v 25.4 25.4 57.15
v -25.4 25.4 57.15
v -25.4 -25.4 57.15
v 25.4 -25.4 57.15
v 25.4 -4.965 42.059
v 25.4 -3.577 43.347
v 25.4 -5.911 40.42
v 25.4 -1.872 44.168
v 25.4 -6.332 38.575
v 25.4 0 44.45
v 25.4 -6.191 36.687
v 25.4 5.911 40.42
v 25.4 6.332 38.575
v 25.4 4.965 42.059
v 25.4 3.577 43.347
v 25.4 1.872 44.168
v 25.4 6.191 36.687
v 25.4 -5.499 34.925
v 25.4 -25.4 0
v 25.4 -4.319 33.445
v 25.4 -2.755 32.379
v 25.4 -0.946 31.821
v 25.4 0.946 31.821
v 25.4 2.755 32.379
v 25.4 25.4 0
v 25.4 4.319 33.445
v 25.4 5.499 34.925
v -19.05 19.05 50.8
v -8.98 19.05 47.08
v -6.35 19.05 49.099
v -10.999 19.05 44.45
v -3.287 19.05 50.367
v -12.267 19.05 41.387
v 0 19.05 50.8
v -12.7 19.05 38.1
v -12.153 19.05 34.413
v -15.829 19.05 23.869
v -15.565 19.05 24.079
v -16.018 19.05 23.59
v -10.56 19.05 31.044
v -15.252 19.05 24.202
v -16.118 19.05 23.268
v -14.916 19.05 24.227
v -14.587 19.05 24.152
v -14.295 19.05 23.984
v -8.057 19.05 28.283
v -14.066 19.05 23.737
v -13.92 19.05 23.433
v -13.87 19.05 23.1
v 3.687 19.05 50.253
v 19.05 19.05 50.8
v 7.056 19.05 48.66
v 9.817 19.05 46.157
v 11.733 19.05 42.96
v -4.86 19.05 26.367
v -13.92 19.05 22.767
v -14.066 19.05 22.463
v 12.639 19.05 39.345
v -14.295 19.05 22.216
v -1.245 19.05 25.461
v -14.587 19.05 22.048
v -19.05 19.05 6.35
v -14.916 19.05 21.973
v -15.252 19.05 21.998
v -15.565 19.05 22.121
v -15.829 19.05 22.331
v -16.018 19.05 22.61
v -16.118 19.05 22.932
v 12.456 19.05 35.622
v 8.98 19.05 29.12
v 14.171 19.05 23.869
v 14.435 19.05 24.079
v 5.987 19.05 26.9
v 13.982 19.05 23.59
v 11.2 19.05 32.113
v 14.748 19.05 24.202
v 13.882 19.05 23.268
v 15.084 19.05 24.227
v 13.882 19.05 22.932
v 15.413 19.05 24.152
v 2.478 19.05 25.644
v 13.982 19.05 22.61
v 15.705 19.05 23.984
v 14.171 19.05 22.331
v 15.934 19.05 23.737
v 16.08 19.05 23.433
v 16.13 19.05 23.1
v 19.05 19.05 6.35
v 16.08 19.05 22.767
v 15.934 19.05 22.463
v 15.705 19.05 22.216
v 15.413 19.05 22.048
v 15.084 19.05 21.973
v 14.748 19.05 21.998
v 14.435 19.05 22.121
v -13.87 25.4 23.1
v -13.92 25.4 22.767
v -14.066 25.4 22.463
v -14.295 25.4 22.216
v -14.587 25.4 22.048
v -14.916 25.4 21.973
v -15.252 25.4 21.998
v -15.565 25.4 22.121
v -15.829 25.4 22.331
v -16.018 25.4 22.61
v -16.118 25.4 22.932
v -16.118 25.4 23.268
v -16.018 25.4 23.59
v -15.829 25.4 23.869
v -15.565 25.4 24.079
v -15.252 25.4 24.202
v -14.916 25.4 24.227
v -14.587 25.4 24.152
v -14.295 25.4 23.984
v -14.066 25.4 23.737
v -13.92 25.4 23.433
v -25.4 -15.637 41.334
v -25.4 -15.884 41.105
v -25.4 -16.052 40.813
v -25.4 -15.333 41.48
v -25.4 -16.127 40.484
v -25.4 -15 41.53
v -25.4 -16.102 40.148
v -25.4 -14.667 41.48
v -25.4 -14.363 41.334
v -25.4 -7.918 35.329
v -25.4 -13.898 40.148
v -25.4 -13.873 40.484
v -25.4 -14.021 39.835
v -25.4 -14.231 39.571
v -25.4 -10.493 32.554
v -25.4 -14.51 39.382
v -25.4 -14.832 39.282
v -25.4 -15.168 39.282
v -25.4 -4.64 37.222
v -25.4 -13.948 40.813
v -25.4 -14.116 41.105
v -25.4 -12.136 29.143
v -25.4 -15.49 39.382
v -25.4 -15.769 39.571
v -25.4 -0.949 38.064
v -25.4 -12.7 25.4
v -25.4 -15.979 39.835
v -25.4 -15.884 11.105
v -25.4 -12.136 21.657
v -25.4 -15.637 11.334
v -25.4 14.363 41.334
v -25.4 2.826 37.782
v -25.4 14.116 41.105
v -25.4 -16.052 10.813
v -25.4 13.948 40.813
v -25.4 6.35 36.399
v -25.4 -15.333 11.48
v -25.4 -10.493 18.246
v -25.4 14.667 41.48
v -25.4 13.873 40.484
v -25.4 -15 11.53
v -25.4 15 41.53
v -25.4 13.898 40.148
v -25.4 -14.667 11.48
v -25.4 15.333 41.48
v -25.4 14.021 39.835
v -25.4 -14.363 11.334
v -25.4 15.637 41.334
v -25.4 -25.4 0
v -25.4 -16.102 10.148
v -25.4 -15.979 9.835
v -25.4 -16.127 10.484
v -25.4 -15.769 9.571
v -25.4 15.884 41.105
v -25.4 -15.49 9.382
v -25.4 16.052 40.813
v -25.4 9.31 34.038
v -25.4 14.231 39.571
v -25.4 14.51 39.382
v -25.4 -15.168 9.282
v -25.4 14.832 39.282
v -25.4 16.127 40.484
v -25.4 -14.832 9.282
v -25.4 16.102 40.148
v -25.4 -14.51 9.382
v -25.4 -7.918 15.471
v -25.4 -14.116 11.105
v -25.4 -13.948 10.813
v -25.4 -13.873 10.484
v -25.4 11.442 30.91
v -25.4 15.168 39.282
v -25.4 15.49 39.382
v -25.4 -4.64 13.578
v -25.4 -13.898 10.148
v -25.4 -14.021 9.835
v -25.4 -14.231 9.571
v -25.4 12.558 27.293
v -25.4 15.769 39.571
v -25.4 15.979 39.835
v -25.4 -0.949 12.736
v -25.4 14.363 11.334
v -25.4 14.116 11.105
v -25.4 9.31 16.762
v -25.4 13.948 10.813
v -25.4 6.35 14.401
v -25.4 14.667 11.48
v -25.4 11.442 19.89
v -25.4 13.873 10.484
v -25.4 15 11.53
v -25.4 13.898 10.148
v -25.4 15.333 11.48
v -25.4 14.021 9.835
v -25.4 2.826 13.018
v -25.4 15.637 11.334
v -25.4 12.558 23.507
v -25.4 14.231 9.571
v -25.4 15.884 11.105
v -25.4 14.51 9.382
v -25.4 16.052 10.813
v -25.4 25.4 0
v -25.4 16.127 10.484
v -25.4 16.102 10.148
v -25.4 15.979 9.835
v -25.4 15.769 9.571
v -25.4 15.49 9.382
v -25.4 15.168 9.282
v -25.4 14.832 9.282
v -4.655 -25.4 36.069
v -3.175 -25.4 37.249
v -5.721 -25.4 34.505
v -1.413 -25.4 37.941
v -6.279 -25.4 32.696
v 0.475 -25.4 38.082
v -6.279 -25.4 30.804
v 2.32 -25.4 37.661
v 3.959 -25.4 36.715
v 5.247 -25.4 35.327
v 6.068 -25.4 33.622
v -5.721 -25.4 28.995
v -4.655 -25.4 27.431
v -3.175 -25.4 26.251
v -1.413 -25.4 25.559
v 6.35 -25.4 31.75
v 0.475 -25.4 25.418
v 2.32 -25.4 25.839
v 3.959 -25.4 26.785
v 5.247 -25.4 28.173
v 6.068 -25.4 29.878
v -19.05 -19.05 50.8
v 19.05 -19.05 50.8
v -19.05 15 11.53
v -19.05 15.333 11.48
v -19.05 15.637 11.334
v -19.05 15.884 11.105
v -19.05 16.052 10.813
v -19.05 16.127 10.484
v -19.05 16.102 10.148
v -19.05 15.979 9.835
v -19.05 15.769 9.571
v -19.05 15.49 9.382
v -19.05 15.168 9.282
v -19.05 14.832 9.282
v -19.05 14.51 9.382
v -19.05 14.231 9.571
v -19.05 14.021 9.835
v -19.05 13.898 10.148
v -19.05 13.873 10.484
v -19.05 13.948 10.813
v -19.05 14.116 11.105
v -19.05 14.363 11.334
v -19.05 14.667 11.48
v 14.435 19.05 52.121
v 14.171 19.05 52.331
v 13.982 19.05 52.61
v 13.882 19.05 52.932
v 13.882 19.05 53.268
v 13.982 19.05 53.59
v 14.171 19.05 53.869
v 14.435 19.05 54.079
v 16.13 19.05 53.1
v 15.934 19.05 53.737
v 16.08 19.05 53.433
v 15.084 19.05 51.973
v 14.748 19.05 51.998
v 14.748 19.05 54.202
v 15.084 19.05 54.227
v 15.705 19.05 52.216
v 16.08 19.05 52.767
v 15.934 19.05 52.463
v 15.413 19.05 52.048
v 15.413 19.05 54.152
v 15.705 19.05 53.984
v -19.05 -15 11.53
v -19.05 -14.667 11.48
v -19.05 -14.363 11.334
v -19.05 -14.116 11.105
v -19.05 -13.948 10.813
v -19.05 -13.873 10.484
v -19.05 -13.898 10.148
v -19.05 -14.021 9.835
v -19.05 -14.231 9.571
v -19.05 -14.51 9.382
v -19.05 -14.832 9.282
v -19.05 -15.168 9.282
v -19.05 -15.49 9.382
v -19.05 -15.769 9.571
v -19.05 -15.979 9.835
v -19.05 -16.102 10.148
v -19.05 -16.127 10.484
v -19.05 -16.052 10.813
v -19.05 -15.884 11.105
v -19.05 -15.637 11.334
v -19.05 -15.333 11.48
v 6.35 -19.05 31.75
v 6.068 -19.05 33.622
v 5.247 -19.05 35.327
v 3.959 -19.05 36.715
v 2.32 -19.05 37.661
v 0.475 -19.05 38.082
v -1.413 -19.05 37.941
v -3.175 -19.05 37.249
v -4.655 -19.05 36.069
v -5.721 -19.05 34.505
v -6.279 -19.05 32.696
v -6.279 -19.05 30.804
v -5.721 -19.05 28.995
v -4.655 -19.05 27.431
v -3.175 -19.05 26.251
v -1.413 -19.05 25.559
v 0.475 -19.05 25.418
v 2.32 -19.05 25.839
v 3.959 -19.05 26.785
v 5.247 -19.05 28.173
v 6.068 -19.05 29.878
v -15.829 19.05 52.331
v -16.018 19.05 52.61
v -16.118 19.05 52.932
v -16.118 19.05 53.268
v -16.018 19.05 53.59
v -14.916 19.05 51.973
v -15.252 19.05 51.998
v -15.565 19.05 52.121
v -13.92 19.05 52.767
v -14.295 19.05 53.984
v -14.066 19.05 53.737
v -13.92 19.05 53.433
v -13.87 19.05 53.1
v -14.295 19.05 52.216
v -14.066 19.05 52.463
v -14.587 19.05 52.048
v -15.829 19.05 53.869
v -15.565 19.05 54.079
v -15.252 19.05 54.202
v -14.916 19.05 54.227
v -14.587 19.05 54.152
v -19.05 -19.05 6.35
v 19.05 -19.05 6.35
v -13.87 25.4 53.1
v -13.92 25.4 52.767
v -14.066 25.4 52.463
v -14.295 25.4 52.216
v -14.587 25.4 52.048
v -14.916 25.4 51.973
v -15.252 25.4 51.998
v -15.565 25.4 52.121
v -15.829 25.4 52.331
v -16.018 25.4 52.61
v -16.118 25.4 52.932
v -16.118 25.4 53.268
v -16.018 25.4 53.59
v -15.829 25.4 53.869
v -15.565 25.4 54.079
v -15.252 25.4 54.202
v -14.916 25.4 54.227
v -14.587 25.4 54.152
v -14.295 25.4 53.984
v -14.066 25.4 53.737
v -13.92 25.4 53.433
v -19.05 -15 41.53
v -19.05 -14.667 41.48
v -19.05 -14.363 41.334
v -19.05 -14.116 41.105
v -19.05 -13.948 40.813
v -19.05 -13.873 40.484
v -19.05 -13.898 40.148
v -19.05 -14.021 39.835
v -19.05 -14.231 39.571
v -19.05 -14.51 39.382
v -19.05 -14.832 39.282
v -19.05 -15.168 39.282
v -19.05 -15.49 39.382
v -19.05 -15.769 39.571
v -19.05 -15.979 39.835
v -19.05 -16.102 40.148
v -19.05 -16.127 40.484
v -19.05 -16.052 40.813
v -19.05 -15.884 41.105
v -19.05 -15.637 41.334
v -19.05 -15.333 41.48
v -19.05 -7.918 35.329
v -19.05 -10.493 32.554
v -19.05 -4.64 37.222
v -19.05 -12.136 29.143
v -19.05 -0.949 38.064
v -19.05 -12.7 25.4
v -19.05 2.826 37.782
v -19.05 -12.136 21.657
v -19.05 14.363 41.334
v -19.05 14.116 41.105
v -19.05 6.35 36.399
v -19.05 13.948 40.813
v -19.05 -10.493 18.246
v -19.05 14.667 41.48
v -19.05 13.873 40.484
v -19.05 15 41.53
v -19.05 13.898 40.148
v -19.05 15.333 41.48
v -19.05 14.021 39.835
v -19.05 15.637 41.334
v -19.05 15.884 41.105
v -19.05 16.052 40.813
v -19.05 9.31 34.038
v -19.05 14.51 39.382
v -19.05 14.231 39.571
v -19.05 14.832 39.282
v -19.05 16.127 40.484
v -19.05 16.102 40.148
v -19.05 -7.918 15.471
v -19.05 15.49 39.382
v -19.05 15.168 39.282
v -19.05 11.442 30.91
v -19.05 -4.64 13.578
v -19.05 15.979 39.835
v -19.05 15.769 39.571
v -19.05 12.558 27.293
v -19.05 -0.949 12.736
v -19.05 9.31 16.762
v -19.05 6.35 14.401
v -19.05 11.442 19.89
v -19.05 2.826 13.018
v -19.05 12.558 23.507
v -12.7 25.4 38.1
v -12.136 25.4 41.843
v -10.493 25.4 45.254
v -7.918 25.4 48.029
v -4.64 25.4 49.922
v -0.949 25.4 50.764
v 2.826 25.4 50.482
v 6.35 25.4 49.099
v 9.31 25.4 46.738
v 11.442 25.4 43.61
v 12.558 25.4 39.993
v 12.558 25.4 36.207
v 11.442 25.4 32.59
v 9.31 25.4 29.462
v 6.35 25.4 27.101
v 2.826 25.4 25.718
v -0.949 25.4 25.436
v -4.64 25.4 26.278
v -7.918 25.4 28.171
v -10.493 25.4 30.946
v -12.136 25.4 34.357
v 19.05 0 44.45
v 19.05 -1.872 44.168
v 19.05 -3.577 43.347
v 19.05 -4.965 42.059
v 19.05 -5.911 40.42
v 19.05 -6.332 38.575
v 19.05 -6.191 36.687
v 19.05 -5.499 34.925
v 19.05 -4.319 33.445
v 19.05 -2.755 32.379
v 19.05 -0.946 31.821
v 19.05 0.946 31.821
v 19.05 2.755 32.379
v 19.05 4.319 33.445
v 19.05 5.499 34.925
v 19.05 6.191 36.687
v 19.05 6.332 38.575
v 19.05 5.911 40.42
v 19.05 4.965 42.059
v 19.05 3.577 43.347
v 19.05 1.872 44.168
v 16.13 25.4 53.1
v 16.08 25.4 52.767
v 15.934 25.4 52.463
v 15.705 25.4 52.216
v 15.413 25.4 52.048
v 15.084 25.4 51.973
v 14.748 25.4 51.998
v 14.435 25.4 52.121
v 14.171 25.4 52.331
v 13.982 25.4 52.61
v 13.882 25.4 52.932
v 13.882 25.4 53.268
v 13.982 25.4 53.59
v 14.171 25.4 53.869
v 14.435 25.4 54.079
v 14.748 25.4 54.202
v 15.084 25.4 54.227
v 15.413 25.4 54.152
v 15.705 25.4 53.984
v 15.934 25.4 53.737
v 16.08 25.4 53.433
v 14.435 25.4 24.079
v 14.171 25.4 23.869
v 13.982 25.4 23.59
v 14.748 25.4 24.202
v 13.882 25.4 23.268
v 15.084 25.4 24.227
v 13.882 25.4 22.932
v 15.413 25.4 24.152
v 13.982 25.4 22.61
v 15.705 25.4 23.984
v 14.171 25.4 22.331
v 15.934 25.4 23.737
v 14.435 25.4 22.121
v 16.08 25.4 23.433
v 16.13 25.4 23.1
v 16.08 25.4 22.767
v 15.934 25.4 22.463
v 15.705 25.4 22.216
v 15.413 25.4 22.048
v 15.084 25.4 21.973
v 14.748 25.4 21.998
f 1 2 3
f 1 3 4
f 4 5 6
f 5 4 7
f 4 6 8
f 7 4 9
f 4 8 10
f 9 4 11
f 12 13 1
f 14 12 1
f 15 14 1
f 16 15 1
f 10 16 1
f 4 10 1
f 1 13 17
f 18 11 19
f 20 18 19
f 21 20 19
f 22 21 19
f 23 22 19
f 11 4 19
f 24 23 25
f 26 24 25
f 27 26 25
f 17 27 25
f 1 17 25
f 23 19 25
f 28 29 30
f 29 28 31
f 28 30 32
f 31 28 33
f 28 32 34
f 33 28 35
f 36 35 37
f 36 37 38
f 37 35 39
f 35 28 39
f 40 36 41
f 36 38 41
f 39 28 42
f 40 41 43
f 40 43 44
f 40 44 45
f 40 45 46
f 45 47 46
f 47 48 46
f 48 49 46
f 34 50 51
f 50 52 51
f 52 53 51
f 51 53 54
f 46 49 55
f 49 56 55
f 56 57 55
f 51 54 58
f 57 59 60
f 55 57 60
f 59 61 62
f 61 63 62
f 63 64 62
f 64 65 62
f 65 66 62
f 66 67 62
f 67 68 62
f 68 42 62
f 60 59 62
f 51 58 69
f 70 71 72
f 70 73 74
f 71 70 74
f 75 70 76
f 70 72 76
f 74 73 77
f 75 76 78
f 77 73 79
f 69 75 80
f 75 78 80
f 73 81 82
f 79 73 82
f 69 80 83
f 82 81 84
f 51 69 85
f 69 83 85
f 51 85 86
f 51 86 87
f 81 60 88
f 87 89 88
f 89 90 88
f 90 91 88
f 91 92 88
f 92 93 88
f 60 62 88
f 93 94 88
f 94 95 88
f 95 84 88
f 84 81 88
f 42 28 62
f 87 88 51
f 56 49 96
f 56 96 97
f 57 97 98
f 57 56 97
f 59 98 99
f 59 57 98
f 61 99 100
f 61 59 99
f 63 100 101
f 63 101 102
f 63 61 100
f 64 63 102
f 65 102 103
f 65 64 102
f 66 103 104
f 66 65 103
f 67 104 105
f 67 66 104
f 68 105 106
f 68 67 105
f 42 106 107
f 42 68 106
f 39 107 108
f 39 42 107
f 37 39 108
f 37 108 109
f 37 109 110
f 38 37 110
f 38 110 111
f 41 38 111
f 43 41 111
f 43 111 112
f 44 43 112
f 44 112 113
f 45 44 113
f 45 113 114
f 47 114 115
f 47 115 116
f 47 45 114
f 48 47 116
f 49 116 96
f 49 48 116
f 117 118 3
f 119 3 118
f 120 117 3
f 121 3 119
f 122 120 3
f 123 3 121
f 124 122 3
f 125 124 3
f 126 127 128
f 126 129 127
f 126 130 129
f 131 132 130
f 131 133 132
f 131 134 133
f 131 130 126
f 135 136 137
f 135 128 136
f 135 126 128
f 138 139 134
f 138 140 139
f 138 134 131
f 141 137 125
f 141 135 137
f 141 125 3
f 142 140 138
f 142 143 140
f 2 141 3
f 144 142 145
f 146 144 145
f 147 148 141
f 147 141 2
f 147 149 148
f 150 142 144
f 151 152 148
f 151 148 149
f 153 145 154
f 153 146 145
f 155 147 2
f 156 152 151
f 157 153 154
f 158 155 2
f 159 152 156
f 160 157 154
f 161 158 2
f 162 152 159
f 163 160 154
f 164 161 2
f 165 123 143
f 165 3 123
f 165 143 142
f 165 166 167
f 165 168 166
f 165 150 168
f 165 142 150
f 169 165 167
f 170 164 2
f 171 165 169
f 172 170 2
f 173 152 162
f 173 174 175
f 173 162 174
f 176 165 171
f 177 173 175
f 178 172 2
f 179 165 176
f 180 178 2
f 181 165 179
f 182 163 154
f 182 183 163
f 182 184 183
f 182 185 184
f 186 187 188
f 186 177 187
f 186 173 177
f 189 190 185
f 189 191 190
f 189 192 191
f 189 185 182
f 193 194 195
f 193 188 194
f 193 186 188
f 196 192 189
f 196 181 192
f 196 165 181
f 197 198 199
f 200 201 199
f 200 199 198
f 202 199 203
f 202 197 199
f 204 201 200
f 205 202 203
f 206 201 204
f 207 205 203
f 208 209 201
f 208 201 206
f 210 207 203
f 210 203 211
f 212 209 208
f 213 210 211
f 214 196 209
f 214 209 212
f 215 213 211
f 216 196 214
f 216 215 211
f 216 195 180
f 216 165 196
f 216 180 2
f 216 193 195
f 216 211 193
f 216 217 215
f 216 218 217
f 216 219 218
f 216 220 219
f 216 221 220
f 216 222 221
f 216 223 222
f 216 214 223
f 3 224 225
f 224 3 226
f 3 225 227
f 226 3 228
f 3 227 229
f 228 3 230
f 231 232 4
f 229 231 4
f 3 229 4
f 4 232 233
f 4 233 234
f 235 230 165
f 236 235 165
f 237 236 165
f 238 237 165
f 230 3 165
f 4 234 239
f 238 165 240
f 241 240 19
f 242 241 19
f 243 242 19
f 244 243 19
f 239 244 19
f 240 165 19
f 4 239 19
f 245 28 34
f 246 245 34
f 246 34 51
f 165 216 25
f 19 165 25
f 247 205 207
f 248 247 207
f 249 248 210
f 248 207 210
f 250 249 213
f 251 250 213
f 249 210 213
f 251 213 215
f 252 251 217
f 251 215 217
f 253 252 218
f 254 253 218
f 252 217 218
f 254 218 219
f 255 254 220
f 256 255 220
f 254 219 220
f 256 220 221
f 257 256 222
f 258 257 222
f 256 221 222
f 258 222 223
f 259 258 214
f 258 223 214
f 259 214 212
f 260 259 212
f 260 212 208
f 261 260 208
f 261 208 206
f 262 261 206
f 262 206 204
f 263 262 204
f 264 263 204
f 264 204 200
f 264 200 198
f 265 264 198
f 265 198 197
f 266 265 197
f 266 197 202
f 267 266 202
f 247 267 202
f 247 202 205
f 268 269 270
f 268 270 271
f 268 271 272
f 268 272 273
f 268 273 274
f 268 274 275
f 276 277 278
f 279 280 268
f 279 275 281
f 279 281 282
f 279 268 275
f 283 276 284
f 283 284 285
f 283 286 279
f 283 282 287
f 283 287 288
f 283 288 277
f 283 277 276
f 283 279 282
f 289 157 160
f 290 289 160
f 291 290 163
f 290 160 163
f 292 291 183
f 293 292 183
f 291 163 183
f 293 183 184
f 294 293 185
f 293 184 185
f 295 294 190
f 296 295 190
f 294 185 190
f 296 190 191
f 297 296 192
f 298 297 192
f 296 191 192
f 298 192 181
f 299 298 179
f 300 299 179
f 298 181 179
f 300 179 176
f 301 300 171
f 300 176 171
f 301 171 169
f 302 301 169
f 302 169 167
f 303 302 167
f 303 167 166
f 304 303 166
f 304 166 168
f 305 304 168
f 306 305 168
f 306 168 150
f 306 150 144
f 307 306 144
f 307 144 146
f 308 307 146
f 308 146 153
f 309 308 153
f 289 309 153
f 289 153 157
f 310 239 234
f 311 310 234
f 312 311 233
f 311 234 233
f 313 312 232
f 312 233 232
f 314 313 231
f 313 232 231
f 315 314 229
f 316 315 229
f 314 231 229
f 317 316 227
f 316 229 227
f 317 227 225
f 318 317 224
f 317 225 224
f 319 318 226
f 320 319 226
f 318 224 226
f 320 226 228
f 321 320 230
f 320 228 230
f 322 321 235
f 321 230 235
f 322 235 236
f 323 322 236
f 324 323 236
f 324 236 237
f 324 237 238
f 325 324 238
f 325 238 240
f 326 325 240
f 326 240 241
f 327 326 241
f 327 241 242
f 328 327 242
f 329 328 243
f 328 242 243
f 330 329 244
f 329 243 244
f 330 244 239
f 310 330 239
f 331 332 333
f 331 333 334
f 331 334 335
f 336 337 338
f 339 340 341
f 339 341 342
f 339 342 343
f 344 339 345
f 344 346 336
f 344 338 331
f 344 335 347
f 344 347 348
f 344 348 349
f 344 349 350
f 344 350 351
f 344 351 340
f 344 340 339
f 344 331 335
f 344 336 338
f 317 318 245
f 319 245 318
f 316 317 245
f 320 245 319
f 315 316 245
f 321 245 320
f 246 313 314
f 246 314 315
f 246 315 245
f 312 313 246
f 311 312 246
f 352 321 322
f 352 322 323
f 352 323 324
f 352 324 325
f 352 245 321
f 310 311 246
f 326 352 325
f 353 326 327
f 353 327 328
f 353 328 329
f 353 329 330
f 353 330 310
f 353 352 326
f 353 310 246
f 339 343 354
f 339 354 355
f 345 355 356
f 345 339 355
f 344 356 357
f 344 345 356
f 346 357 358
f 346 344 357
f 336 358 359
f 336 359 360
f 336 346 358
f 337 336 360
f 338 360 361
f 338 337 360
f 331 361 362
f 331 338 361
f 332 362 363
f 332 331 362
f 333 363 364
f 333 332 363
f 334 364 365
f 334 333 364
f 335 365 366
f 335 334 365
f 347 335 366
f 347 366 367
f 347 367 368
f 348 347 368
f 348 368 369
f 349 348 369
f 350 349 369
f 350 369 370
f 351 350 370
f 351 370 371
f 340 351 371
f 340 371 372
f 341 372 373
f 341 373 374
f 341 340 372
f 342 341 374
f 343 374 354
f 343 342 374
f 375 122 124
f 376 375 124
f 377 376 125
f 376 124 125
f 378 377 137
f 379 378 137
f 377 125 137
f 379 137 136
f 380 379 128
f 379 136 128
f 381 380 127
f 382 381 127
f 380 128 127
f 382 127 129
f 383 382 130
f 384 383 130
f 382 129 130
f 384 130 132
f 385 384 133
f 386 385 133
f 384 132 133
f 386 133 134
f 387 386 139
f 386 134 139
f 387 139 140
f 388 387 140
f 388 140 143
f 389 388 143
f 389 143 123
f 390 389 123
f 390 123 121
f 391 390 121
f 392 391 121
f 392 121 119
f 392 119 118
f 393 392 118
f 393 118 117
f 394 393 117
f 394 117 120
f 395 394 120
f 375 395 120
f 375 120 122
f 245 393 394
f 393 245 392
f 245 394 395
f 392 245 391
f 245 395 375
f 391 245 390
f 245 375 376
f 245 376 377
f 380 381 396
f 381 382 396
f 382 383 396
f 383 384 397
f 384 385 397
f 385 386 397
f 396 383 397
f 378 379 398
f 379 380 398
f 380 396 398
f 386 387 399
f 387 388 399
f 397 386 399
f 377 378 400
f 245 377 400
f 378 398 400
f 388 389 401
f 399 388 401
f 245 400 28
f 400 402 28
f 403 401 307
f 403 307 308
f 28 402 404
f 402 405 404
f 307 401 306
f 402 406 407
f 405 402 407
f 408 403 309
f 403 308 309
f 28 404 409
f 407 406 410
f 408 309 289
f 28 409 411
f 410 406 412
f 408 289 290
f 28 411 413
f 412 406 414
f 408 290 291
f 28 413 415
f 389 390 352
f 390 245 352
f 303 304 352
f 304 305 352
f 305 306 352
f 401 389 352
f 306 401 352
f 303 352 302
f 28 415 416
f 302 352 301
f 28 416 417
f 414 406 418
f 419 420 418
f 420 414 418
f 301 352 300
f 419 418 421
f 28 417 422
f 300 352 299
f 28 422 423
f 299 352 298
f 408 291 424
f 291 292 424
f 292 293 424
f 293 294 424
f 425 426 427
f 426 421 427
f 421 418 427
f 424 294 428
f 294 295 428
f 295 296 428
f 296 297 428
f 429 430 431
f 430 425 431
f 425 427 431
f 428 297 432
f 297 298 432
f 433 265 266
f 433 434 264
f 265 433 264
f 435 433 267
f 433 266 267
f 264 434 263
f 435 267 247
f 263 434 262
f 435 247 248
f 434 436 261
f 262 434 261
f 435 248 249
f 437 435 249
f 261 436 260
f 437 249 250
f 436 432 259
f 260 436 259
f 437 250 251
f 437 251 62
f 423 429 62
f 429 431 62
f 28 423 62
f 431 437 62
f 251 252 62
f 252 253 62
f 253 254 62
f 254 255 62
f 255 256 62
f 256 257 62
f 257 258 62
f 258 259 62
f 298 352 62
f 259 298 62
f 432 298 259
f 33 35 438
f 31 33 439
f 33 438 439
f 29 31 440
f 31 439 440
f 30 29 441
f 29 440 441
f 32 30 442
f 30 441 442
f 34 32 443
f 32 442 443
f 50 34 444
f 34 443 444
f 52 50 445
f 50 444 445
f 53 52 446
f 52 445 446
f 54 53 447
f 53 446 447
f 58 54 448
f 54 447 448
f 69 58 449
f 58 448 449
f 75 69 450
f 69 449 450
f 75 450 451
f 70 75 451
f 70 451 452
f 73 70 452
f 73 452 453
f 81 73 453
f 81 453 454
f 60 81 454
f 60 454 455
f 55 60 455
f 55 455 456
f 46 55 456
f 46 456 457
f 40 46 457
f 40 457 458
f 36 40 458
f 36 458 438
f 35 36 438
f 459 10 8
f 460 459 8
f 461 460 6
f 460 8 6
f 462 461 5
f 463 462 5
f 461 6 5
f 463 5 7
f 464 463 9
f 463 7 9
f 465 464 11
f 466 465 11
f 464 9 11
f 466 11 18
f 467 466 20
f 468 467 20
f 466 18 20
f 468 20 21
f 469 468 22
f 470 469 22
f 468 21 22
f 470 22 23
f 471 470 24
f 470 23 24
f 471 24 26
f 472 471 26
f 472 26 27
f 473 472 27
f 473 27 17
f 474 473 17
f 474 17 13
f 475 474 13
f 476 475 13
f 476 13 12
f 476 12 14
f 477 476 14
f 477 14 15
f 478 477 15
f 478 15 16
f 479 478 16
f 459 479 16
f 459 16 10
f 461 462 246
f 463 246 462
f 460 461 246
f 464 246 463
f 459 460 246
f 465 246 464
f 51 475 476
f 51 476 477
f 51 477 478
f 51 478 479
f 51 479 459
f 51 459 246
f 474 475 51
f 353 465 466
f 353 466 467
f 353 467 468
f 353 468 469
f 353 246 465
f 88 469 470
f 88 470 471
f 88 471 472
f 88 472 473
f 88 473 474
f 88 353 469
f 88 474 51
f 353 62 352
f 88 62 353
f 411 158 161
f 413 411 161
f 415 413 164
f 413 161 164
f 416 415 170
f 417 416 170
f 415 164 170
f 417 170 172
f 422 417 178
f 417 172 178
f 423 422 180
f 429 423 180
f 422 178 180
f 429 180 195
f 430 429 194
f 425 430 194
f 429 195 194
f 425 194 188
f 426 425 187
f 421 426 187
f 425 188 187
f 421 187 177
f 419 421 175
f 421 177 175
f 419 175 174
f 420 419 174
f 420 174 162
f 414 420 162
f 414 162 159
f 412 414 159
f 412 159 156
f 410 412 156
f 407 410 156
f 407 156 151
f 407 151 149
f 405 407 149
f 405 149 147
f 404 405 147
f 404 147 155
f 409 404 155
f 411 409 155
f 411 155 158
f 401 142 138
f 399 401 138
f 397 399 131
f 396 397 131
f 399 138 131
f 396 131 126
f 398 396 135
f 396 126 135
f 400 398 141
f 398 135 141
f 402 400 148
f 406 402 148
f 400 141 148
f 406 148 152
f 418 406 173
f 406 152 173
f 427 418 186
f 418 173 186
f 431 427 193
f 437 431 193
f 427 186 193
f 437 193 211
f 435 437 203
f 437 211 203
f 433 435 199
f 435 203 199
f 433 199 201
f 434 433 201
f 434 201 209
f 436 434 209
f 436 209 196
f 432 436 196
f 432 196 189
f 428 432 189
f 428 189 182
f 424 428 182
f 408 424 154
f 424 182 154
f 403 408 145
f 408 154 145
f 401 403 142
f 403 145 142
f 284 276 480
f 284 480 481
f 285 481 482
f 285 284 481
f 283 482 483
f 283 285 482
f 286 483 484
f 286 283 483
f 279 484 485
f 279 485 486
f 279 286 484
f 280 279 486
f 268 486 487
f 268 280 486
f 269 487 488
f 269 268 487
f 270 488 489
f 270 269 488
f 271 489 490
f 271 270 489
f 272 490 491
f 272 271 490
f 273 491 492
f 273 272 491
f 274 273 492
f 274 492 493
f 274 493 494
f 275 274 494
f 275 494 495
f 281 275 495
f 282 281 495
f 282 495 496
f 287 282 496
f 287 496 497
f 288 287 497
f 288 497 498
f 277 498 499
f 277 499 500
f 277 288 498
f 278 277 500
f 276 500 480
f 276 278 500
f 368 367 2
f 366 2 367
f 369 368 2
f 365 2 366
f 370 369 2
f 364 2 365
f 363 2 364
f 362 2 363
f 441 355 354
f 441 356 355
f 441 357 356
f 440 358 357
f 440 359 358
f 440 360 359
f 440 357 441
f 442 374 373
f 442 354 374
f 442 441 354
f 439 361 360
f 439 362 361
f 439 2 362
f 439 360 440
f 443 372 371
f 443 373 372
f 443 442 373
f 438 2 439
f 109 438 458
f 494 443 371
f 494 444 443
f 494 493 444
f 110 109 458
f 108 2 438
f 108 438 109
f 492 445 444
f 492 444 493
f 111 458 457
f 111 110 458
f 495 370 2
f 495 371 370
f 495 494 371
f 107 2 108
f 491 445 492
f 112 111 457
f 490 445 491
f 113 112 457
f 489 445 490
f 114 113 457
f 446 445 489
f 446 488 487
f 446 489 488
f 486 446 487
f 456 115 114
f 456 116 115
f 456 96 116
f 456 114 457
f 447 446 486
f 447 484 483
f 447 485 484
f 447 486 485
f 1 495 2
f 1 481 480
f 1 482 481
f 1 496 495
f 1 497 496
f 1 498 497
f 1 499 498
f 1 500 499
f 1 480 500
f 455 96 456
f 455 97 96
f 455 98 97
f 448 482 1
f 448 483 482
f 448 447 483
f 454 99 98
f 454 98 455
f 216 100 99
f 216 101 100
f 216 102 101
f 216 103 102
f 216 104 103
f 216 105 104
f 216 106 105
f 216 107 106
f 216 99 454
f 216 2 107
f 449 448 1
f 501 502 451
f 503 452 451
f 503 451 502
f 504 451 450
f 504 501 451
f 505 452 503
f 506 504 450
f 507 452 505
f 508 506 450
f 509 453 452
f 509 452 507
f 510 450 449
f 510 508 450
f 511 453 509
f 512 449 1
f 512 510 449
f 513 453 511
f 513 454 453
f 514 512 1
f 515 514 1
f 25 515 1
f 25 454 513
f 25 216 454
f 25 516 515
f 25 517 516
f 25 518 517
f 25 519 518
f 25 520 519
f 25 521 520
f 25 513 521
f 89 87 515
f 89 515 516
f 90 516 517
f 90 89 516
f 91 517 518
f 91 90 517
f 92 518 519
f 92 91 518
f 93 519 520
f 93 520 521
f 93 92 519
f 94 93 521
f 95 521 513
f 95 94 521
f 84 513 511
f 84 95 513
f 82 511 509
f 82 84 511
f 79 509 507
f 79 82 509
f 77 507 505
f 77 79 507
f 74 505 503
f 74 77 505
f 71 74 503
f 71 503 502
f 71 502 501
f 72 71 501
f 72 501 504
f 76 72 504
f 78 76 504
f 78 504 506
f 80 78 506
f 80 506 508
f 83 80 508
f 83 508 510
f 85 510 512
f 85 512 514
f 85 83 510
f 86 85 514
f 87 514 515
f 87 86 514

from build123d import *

# Parameters (mm, degrees)
SKETCH1_W                                = 50.8
SKETCH1_H                                = 50.8
BOSS_EXTRUDE1_DEPTH                      = 57.15
CUT_EXTRUDE2_START                       = 6.35
SKETCH3_W                                = 38.1
SKETCH3_H                                = 38.1
CUT_EXTRUDE2_DEPTH                       = 44.45
SKETCH5_R                                = 12.7
CUT_EXTRUDE3_DEPTH                       = 6.35
SKETCH6_R                                = 12.7
CUT_EXTRUDE4_DEPTH                       = 6.35
SKETCH7_R                                = 6.35
CUT_EXTRUDE5_DEPTH                       = 6.35
F_3_8_0_375_CLEARANCE_DOWEL_HOLE1_REACH  = 70.392
F_3_8_0_375_CLEARANCE_DOWEL_HOLE1_BORE_R = 6.35
TAP_DRILL_FOR_4_40_TAP1_REACH            = 82.572
TAP_DRILL_FOR_4_40_TAP1_BORE_R           = 1.1303
TAP_START                                = 19.05
TAP_DRILL_FOR_4_40_TAP2_OUTLINE_R        = 1.1303
TAP_DRILL_FOR_4_40_TAP2_DEPTH            = 6.35


# Read off the part's stored shape, not the designer's step: Tap Drill for #4-40 Tap2
with BuildPart() as part:
    # Sketch1 → Boss-Extrude1 (new body)
    with BuildSketch(Plane.XY):
        Rectangle(SKETCH1_W, SKETCH1_H)
    extrude(amount=BOSS_EXTRUDE1_DEPTH)

    # Sketch3 → Cut-Extrude2 (cut)
    with BuildSketch(Plane.XY.offset(CUT_EXTRUDE2_START)):
        Rectangle(SKETCH3_W, SKETCH3_H)
    extrude(amount=CUT_EXTRUDE2_DEPTH, mode=Mode.SUBTRACT)

    # Sketch5 → Cut-Extrude3 (cut)
    with BuildSketch(Plane.ZY.offset(25.4)):
        with Locations(Location((25.4, 0, 0), (0, 0, 270))):
            Circle(SKETCH5_R)
    extrude(amount=-CUT_EXTRUDE3_DEPTH, mode=Mode.SUBTRACT)

    # Sketch6 → Cut-Extrude4 (cut)
    with BuildSketch(Plane(origin=(0, 25.4, 0), x_dir=(1, 0, 0), z_dir=(0, 1, 0))):
        with Locations(Location((0, -38.1, 0), (0, 0, 180))):
            Circle(SKETCH6_R)
    extrude(amount=-CUT_EXTRUDE4_DEPTH, mode=Mode.SUBTRACT)

    # Sketch7 → Cut-Extrude5 (cut)
    with BuildSketch(Plane.XZ.offset(25.4)):
        with Locations((0, 31.75)):
            Circle(SKETCH7_R)
    extrude(amount=-CUT_EXTRUDE5_DEPTH, mode=Mode.SUBTRACT)

    # 3/8 (0.375) Clearance Dowel Hole1 bore (on position points) → 3/8 (0.375) Clearance Dowel Hole1 (cut, up to next)
    with BuildSketch(Plane(origin=(25.4, 0, 38.1), x_dir=(0, 0, 1), z_dir=(1, 0, 0)), mode=Mode.PRIVATE) as f_3_8_0_375_clearance_dowel_hole1_sk1:
        Circle(F_3_8_0_375_CLEARANCE_DOWEL_HOLE1_BORE_R)
    f_3_8_0_375_clearance_dowel_hole1_tool1 = extrude(f_3_8_0_375_clearance_dowel_hole1_sk1.sketch, amount=-F_3_8_0_375_CLEARANCE_DOWEL_HOLE1_REACH, mode=Mode.PRIVATE) & part.part
    add(f_3_8_0_375_clearance_dowel_hole1_tool1.solids().sort_by_distance((25.4, 0, 38.1))[0], mode=Mode.SUBTRACT)

    # Tap Drill for #4-40 Tap1 bore → Tap Drill for #4-40 Tap1 (cut, up to next)
    with BuildSketch(Plane.ZY.offset(25.4), mode=Mode.PRIVATE) as tap_drill_for_4_40_tap1_sk1:
        with Locations((10.4, -15)):
            Circle(TAP_DRILL_FOR_4_40_TAP1_BORE_R)
    tap_drill_for_4_40_tap1_tool1 = extrude(tap_drill_for_4_40_tap1_sk1.sketch, amount=-TAP_DRILL_FOR_4_40_TAP1_REACH, mode=Mode.PRIVATE) & part.part
    # Tap Drill for #4-40 Tap1 bore → Tap Drill for #4-40 Tap1 (cut, up to next)
    with BuildSketch(Plane.ZY.offset(25.4), mode=Mode.PRIVATE) as tap_drill_for_4_40_tap1_sk2:
        with Locations((10.4, 15)):
            Circle(TAP_DRILL_FOR_4_40_TAP1_BORE_R)
    tap_drill_for_4_40_tap1_tool2 = extrude(tap_drill_for_4_40_tap1_sk2.sketch, amount=-TAP_DRILL_FOR_4_40_TAP1_REACH, mode=Mode.PRIVATE) & part.part
    # Tap Drill for #4-40 Tap1 bore → Tap Drill for #4-40 Tap1 (cut, up to next)
    with BuildSketch(Plane.ZY.offset(25.4), mode=Mode.PRIVATE) as tap_drill_for_4_40_tap1_sk3:
        with Locations((40.4, 15)):
            Circle(TAP_DRILL_FOR_4_40_TAP1_BORE_R)
    tap_drill_for_4_40_tap1_tool3 = extrude(tap_drill_for_4_40_tap1_sk3.sketch, amount=-TAP_DRILL_FOR_4_40_TAP1_REACH, mode=Mode.PRIVATE) & part.part
    # Tap Drill for #4-40 Tap1 bore → Tap Drill for #4-40 Tap1 (cut, up to next)
    with BuildSketch(Plane.ZY.offset(25.4), mode=Mode.PRIVATE) as tap_drill_for_4_40_tap1_sk4:
        with Locations((40.4, -15)):
            Circle(TAP_DRILL_FOR_4_40_TAP1_BORE_R)
    tap_drill_for_4_40_tap1_tool4 = extrude(tap_drill_for_4_40_tap1_sk4.sketch, amount=-TAP_DRILL_FOR_4_40_TAP1_REACH, mode=Mode.PRIVATE) & part.part
    add(tap_drill_for_4_40_tap1_tool1.solids().sort_by_distance((-25.4, -15, 10.4))[0], mode=Mode.SUBTRACT)
    add(tap_drill_for_4_40_tap1_tool2.solids().sort_by_distance((-25.4, 15, 10.4))[0], mode=Mode.SUBTRACT)
    add(tap_drill_for_4_40_tap1_tool3.solids().sort_by_distance((-25.4, 15, 40.4))[0], mode=Mode.SUBTRACT)
    add(tap_drill_for_4_40_tap1_tool4.solids().sort_by_distance((-25.4, -15, 40.4))[0], mode=Mode.SUBTRACT)

    # Tap Drill for #4-40 Tap2 outline → Tap Drill for #4-40 Tap2 (cut)
    with BuildSketch(Plane(origin=(0, 0, 0), x_dir=(1, 0, 0), z_dir=(0, 1, 0)).offset(TAP_START)):
        with Locations((-15, -53.1)):
            Circle(TAP_DRILL_FOR_4_40_TAP2_OUTLINE_R)
        with Locations((15, -53.1)):
            Circle(TAP_DRILL_FOR_4_40_TAP2_OUTLINE_R)
        with Locations((15, -23.1)):
            Circle(TAP_DRILL_FOR_4_40_TAP2_OUTLINE_R)
        with Locations((-15, -23.1)):
            Circle(TAP_DRILL_FOR_4_40_TAP2_OUTLINE_R)
    extrude(amount=TAP_DRILL_FOR_4_40_TAP2_DEPTH, mode=Mode.SUBTRACT)


solid = part.part
